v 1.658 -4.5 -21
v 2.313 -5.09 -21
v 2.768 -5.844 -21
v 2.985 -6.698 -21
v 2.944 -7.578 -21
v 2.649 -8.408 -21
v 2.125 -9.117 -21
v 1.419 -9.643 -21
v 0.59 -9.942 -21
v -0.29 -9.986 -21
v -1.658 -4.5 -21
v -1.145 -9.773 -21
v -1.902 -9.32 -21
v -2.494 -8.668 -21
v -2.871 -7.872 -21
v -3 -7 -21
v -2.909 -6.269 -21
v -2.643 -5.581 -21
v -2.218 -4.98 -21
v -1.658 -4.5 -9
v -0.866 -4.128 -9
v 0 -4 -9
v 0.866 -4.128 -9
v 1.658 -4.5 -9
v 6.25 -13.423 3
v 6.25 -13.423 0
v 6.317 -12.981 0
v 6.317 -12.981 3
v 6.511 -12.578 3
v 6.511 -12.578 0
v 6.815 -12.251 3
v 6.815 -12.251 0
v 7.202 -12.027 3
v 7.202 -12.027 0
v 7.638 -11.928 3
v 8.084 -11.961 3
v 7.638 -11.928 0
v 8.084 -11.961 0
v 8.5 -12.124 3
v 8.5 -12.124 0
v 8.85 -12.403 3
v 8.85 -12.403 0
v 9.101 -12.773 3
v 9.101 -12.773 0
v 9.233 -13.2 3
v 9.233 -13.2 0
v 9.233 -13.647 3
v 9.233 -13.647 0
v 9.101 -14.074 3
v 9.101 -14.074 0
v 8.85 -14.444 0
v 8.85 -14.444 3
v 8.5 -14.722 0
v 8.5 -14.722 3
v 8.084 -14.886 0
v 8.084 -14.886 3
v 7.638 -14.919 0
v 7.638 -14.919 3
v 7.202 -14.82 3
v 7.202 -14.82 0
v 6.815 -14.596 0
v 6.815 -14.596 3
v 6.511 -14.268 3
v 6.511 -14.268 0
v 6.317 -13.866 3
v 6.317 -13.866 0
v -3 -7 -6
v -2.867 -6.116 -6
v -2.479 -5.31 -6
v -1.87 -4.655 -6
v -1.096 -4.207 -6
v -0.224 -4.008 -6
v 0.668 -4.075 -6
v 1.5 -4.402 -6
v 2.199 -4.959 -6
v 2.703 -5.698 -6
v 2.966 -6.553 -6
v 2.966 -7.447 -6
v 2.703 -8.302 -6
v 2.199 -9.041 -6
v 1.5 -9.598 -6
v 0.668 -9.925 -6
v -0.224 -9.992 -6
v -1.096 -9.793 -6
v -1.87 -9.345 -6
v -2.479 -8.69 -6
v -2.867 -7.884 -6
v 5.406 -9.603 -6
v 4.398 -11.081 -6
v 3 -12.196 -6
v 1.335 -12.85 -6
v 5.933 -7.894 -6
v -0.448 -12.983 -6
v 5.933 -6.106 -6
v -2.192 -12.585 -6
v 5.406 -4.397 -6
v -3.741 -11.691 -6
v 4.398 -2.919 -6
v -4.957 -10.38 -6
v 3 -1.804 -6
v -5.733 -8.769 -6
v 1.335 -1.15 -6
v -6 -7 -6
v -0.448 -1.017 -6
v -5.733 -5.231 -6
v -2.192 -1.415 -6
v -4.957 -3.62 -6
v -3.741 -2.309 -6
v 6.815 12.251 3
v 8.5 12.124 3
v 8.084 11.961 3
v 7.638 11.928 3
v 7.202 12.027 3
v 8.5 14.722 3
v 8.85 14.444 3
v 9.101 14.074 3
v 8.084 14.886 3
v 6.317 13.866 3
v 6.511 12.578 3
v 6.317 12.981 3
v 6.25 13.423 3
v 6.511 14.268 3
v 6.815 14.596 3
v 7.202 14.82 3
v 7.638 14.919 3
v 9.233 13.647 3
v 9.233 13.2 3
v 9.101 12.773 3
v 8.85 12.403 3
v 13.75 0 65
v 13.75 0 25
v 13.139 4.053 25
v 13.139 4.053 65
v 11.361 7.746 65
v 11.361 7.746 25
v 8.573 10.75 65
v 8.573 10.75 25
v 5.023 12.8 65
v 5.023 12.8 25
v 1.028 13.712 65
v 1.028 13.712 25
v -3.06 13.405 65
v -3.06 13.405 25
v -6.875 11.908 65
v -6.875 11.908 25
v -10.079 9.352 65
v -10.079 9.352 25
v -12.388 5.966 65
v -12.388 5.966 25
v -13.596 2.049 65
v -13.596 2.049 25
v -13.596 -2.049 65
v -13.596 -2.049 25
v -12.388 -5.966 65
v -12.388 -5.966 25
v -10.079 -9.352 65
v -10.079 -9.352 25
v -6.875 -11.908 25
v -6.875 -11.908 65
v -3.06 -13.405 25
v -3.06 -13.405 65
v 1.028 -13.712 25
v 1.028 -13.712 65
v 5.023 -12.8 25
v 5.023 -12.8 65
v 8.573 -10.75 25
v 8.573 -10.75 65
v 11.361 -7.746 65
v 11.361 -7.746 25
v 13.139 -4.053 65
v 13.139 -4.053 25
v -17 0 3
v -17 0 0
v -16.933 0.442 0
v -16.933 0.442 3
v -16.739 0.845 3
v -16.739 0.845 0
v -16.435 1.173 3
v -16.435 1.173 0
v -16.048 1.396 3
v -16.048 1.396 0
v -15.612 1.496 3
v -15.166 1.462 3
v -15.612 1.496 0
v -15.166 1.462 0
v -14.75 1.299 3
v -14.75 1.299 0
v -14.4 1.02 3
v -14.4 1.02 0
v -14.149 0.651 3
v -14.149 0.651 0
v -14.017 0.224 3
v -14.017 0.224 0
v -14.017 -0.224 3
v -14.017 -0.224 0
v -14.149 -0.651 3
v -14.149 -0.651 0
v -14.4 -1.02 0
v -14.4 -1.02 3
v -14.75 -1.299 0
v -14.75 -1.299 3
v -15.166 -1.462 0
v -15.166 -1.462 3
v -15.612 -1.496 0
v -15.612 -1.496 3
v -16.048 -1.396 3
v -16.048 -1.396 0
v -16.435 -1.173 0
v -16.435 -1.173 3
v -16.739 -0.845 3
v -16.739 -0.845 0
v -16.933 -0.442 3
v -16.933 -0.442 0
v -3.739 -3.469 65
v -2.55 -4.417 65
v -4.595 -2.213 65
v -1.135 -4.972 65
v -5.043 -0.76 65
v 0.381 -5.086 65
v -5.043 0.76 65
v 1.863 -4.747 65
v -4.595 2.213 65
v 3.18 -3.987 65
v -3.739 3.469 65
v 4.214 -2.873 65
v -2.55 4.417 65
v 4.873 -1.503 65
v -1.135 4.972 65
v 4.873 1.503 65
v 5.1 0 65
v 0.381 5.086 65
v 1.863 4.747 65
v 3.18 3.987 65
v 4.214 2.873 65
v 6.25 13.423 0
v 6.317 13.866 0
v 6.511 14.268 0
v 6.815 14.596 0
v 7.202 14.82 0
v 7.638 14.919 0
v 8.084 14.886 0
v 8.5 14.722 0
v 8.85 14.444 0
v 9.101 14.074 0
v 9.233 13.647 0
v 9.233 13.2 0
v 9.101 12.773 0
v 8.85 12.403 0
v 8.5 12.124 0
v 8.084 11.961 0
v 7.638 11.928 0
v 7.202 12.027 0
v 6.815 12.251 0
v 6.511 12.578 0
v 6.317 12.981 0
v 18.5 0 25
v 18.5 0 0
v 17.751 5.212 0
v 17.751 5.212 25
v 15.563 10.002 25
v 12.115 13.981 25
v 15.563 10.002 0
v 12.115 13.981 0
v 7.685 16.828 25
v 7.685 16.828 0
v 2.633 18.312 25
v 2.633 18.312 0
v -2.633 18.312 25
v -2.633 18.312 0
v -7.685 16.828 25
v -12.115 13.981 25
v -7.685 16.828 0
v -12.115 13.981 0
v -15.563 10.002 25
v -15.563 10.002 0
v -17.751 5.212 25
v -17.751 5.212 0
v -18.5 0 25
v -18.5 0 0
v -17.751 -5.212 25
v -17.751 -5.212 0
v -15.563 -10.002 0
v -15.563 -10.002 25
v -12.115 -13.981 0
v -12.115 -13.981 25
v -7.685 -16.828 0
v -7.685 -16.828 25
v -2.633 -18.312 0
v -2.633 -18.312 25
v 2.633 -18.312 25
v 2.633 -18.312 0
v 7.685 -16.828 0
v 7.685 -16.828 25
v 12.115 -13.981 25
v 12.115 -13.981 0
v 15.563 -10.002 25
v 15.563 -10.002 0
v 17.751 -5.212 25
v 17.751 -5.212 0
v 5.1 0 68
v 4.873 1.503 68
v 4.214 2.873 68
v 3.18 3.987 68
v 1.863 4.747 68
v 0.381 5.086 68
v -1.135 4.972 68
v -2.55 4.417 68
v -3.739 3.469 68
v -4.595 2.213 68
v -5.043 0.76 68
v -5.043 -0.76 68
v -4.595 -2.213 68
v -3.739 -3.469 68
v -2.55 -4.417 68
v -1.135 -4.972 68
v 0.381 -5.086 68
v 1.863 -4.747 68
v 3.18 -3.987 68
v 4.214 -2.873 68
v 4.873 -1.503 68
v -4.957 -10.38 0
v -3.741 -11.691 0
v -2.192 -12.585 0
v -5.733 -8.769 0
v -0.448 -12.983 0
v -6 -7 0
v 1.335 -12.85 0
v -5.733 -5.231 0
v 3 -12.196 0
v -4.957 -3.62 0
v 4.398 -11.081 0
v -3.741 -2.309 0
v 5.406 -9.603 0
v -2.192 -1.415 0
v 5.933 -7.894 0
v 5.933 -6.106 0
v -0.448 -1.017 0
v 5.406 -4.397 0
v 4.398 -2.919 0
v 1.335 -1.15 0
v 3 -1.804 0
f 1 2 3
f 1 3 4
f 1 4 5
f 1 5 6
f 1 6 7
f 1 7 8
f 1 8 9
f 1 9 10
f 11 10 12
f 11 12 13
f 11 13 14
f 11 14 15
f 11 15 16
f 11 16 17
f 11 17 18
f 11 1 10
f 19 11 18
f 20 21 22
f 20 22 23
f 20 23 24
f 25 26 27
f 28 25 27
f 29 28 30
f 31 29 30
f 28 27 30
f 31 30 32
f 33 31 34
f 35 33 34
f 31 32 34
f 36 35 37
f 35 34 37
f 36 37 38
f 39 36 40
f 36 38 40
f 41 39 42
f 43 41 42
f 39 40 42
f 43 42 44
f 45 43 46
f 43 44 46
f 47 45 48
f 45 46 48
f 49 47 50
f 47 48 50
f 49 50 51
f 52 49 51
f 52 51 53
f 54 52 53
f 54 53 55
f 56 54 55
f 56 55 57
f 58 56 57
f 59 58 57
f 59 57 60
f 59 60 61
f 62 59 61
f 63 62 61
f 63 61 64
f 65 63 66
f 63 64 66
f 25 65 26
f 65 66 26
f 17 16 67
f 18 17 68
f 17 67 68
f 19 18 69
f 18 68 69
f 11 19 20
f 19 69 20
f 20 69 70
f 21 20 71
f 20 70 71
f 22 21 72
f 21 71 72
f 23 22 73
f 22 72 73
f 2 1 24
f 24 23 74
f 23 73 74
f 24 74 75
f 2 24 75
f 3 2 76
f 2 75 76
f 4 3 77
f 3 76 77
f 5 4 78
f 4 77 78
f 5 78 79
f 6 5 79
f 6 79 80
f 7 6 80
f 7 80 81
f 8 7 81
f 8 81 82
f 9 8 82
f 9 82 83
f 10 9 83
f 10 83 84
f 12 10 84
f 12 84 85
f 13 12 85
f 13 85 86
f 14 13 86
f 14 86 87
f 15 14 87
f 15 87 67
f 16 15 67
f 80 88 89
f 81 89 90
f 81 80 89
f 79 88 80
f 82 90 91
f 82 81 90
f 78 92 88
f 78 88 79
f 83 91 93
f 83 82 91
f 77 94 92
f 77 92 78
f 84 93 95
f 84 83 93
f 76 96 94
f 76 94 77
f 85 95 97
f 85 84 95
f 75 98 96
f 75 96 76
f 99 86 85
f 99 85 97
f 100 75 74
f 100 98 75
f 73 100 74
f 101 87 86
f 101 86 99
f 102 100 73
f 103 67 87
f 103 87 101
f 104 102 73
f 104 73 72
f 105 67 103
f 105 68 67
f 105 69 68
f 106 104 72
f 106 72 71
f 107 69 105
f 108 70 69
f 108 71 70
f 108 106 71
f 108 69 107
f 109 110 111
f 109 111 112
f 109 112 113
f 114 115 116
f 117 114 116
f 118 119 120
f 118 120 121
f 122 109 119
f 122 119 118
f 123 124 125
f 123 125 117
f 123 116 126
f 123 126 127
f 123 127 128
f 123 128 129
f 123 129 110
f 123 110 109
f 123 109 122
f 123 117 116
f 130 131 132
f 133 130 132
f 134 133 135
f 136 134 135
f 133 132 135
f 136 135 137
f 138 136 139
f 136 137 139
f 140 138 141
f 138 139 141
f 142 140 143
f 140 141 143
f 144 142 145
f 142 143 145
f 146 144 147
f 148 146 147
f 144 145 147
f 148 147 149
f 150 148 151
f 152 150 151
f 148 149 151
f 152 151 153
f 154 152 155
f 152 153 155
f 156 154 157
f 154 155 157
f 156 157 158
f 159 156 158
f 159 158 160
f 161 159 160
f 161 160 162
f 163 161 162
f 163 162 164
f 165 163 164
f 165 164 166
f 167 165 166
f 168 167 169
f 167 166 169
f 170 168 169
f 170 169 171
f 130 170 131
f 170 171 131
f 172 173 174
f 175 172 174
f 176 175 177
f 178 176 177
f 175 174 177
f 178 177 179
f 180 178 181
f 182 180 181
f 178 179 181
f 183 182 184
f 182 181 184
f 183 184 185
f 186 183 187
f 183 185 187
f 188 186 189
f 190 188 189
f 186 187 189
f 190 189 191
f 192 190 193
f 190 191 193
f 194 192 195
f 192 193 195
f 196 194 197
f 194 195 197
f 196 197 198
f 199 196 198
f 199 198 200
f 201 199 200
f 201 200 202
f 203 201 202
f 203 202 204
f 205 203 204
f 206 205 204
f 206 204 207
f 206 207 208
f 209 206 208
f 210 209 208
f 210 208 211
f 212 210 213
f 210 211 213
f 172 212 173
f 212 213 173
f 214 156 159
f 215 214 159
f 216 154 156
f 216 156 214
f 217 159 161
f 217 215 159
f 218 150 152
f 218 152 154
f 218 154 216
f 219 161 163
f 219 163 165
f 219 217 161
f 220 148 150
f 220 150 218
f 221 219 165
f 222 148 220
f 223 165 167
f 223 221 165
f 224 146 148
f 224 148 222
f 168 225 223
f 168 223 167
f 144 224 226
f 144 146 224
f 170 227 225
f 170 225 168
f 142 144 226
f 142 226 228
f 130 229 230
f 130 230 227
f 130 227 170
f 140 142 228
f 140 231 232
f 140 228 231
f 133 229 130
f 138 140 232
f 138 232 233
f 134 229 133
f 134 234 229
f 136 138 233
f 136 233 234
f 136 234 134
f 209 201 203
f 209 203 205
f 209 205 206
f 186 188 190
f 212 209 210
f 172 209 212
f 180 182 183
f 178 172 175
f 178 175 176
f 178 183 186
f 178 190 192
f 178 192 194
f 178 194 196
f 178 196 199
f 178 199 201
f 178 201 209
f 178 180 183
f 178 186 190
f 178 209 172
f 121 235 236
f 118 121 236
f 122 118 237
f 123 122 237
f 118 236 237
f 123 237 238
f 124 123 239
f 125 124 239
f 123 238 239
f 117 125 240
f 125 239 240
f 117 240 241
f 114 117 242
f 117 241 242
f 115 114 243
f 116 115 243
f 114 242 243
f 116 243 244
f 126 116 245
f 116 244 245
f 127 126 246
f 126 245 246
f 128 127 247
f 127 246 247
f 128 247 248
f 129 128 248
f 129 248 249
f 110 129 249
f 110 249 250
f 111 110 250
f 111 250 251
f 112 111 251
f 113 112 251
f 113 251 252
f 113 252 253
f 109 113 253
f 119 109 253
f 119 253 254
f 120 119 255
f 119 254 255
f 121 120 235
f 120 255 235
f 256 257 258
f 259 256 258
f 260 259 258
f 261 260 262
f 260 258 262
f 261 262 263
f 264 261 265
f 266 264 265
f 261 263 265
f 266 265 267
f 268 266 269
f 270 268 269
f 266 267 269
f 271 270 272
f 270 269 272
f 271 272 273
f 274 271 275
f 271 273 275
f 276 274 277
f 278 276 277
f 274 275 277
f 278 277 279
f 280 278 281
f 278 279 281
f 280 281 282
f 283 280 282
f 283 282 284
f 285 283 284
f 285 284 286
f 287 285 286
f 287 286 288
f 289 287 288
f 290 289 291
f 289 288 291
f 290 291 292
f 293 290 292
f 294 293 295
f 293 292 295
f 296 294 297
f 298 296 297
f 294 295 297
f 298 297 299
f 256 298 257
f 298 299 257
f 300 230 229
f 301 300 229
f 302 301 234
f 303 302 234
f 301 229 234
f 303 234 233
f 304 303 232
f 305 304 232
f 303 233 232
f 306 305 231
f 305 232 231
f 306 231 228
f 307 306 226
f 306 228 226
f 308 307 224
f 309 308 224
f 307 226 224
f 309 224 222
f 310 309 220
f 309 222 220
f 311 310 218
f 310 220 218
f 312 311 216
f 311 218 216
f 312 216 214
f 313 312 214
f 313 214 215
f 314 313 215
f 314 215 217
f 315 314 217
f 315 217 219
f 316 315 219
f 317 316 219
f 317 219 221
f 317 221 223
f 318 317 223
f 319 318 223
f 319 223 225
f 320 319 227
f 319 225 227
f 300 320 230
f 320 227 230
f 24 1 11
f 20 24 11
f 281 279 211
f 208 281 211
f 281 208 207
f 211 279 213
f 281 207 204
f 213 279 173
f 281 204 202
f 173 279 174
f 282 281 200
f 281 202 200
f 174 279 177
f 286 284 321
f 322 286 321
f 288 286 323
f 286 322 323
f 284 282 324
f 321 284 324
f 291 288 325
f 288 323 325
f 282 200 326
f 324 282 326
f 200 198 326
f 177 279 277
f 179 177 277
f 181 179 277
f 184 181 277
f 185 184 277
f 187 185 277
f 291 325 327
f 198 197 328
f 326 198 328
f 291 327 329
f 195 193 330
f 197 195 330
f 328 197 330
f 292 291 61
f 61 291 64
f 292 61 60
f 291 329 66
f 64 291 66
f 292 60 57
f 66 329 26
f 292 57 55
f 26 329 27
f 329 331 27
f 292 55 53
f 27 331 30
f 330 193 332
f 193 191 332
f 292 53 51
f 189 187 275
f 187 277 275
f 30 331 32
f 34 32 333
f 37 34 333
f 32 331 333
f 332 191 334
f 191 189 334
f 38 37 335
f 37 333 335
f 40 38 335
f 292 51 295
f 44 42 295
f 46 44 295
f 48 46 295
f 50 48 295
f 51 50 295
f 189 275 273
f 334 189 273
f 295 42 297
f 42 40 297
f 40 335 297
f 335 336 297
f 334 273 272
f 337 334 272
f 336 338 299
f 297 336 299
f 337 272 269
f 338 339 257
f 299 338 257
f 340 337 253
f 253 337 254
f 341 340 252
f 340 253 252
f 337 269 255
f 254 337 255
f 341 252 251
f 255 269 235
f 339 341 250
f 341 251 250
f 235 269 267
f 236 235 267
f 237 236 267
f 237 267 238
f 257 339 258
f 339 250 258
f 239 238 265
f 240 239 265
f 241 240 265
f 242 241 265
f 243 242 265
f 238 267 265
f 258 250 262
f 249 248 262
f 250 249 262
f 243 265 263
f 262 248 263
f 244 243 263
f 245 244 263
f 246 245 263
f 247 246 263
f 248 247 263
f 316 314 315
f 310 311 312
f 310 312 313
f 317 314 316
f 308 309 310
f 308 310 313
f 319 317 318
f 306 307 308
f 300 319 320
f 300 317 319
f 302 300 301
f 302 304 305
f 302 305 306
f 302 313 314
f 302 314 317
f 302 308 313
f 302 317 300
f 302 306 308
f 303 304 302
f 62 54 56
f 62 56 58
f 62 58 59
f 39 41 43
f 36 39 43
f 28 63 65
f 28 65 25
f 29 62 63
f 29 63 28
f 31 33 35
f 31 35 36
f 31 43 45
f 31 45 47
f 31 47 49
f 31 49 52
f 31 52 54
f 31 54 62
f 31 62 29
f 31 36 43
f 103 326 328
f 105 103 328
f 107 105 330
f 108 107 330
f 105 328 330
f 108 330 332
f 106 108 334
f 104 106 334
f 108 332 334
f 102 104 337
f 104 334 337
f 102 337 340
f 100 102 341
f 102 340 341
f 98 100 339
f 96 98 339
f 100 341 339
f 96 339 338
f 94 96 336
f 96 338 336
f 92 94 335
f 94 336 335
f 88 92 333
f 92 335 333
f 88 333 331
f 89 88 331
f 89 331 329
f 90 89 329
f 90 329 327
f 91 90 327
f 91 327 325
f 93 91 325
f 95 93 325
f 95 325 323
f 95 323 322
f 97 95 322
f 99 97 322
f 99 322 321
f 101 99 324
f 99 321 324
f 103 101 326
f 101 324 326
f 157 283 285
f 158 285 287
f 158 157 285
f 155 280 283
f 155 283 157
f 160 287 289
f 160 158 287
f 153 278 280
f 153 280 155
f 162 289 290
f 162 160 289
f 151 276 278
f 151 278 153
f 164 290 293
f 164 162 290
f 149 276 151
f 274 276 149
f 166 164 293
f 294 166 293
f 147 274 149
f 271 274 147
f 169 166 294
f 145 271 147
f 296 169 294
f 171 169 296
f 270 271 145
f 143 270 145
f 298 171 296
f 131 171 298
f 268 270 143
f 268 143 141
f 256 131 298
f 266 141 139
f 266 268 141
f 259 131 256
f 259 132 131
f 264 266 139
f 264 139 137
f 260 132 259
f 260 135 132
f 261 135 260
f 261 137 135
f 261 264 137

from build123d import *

# Parameters (mm, degrees)
SKETCH_1_R          = 18.5
EXTRUDE_1_DEPTH     = 25
SKETCH_3_R          = 13.75
EXTRUDE_2_DEPTH     = 40
SKETCH_4_R          = 1.5
CUT_EXTRUDE_1_DEPTH = 3
SKETCH_5_R          = 6
EXTRUDE_3_DEPTH     = 6
SKETCH_6_R          = 3
EXTRUDE_4_DEPTH     = 15
CUT_EXTRUDE_2_DEPTH = 12
SKETCH_8_R          = 5.1
EXTRUDE_5_DEPTH     = 3


with BuildPart() as part:
    # ｽｹｯﾁ1 → ﾎﾞｽ - 押し出し1 (new body)
    with BuildSketch(Plane.XY):
        Circle(SKETCH_1_R)
    extrude(amount=EXTRUDE_1_DEPTH)

    # ｽｹｯﾁ3 → ﾎﾞｽ - 押し出し2 (add)
    with BuildSketch(Plane.XY.offset(25)):
        Circle(SKETCH_3_R)
    extrude(amount=EXTRUDE_2_DEPTH)

    # ｽｹｯﾁ4 → ｶｯﾄ - 押し出し1 (cut)
    with BuildSketch(Plane(origin=(0, 0, 0), x_dir=(-1, 0, 0), z_dir=(0, 0, -1))):
        with Locations((-7.75, 13.423393759)):
            Circle(SKETCH_4_R)
        with Locations((-7.75, -13.423393759)):
            Circle(SKETCH_4_R)
        with Locations((15.5, 0)):
            Circle(SKETCH_4_R)
    extrude(amount=-CUT_EXTRUDE_1_DEPTH, mode=Mode.SUBTRACT)

    # ｽｹｯﾁ5 → ﾎﾞｽ - 押し出し3 (add)
    with BuildSketch(Plane(origin=(0, 0, 0), x_dir=(-1, 0, 0), z_dir=(0, 0, -1))):
        with Locations((0, -7)):
            Circle(SKETCH_5_R)
    extrude(amount=EXTRUDE_3_DEPTH)

    # ｽｹｯﾁ6 → ﾎﾞｽ - 押し出し4 (add)
    with BuildSketch(Plane(origin=(0, 0, -6), x_dir=(-1, 0, 0), z_dir=(0, 0, -1))):
        with Locations((0, -7)):
            Circle(SKETCH_6_R)
    extrude(amount=EXTRUDE_4_DEPTH)

    # ｽｹｯﾁ7 → ｶｯﾄ - 押し出し2 (cut)
    with BuildSketch(Plane(origin=(0, 0, -21), x_dir=(-1, 0, 0), z_dir=(0, 0, -1))):
        with BuildLine():
            ThreePointArc((1.658312395, -4.5), (0, -4), (-1.658312395, -4.5))
            Line((-1.658312395, -4.5), (1.658312395, -4.5))
        make_face()
    extrude(amount=-CUT_EXTRUDE_2_DEPTH, mode=Mode.SUBTRACT)

    # ｽｹｯﾁ8 → ﾎﾞｽ - 押し出し5 (add)
    with BuildSketch(Plane.XY.offset(65)):
        Circle(SKETCH_8_R)
    extrude(amount=EXTRUDE_5_DEPTH)


solid = part.part
